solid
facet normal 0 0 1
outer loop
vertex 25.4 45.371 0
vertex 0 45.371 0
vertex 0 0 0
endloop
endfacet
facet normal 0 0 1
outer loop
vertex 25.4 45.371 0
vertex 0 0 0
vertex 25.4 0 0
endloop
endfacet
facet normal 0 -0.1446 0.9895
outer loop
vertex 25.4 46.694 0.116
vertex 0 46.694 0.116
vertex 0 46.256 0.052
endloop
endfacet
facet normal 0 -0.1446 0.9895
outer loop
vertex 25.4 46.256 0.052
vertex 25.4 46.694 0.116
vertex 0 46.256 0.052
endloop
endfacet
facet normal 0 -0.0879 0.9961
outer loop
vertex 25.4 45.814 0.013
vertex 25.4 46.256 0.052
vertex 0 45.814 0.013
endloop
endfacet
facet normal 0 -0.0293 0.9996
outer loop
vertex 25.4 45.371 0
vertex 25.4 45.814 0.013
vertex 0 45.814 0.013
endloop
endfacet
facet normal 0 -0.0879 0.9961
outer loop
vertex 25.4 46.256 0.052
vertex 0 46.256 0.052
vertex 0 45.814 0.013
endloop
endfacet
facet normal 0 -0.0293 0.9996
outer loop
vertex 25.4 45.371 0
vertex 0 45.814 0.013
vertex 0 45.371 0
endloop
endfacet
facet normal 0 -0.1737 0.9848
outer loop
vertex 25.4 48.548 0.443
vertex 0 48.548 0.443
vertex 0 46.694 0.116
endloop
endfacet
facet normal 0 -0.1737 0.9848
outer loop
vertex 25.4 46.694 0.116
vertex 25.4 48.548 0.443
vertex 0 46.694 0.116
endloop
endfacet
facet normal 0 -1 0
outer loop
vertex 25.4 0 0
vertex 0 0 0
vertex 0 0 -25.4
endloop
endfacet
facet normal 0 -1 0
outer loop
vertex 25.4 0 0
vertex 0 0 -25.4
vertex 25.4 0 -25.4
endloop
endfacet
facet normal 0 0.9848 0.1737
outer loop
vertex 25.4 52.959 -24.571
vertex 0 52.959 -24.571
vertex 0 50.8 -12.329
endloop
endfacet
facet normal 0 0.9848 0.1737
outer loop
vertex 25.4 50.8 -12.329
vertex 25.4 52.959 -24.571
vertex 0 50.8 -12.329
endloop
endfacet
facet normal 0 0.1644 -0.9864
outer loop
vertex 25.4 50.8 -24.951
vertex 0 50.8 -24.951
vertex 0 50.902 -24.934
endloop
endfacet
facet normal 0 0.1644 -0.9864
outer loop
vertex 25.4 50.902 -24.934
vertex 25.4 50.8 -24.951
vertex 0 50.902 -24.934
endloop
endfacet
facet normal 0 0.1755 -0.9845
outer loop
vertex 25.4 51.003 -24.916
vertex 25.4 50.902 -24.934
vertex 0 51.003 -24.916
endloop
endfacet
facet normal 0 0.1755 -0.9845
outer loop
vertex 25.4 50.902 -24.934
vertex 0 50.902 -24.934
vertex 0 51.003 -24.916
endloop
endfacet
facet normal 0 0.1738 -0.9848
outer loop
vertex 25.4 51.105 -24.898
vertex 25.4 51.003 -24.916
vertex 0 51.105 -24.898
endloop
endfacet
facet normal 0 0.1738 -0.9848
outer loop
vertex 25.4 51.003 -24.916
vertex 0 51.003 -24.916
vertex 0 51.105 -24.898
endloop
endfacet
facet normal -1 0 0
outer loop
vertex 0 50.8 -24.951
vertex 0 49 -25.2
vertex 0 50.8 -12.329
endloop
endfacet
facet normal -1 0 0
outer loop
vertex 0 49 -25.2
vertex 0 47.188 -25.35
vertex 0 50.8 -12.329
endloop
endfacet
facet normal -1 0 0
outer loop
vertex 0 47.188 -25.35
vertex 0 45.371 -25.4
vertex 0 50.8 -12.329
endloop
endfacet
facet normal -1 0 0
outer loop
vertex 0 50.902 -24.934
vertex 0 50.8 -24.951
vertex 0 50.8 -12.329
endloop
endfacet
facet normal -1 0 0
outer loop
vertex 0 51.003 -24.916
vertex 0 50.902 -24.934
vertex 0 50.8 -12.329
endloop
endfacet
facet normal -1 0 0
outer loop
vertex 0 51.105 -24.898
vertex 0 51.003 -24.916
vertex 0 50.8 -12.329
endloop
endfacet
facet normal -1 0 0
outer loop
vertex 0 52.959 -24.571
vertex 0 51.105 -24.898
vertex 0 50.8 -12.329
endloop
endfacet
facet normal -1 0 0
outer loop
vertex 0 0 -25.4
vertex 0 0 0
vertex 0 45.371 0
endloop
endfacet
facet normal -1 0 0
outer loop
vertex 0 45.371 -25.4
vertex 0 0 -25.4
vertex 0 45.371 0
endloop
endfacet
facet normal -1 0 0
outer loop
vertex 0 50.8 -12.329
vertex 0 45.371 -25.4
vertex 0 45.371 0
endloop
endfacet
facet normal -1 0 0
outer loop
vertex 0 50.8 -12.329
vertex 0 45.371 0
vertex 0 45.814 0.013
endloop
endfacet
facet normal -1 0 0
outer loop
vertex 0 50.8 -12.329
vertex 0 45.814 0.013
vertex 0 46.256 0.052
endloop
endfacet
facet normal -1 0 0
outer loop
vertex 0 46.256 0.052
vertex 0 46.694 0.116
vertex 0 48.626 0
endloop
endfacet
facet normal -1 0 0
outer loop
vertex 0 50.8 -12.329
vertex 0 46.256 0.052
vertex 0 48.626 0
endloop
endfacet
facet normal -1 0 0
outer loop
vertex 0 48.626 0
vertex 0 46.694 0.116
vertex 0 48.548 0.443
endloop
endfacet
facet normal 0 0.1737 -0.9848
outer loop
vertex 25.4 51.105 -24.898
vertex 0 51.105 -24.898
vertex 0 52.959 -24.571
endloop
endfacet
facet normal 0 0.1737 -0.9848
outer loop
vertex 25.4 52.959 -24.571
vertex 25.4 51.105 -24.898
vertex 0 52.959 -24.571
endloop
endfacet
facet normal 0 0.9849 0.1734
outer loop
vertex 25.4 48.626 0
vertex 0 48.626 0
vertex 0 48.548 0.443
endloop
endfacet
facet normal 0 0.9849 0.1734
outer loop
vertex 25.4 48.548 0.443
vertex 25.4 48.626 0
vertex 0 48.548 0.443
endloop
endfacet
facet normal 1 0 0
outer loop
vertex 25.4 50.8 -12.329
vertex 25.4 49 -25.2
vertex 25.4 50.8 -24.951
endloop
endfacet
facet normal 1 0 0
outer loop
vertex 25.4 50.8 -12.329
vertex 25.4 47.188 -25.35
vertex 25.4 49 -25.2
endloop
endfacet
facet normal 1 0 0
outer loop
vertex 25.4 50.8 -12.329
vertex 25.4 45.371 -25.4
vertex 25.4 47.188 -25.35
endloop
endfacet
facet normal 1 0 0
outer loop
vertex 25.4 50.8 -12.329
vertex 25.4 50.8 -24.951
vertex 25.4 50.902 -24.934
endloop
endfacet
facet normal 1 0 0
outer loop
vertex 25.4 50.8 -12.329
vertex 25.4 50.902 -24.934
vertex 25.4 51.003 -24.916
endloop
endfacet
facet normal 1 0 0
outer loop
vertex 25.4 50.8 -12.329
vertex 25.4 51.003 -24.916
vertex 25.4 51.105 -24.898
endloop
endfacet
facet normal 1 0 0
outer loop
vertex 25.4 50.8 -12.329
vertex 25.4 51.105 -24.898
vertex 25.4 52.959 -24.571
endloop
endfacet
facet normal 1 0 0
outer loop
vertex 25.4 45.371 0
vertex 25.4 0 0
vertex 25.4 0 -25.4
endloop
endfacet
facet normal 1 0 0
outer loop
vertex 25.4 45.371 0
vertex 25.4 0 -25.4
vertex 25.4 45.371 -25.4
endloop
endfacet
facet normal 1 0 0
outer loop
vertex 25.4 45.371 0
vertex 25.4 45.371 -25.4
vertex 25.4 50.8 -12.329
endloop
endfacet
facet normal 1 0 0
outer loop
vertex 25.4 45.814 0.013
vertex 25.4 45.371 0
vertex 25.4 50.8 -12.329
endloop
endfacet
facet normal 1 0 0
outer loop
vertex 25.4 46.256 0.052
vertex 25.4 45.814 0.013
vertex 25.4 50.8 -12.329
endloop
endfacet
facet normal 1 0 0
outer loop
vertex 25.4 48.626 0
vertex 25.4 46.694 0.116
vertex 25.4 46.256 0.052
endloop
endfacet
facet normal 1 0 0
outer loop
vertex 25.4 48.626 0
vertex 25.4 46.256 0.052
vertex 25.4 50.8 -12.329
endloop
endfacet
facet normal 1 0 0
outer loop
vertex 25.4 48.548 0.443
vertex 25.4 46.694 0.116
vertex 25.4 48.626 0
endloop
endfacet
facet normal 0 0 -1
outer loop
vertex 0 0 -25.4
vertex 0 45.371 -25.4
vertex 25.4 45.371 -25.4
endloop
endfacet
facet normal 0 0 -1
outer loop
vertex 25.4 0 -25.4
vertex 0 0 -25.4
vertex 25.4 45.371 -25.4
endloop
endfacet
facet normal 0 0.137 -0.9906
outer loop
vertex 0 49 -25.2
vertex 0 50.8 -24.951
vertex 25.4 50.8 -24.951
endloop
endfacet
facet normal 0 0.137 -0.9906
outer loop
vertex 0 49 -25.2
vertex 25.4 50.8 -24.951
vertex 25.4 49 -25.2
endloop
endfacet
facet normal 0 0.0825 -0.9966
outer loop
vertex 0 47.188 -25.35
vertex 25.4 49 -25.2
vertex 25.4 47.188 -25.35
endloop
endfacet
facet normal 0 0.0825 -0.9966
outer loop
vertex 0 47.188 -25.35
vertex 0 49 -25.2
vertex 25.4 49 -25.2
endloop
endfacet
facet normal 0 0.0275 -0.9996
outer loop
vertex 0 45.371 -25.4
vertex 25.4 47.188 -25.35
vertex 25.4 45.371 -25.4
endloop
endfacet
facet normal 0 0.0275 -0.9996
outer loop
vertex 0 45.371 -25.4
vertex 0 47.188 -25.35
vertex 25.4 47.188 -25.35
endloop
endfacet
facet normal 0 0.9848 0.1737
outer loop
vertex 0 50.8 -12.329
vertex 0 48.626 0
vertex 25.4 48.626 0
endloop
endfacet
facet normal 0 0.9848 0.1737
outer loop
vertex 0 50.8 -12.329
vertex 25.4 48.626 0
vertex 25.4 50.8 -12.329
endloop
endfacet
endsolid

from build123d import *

# Parameters (mm, degrees)
SKETCH1_W              = 25.4
SKETCH1_H              = 50.8
BASE_FLANGE1_DEPTH     = 25.4
SKETCHED_BEND2_DEPTH   = 25.4
SKETCHED_BEND2_2_DEPTH = 25.4


# Read off the part's stored shape, not the designer's step: Sketched Bend2
# Sheet-metal steps are written as plain solids
with BuildPart() as part:
    # Sketch1 → Base-Flange1 (new body)
    with BuildSketch(Plane.XY):
        with Locations((12.7, 25.4)):
            Rectangle(SKETCH1_W, SKETCH1_H)
    extrude(amount=-BASE_FLANGE1_DEPTH)

    # Sketched Bend2 outline → Sketched Bend2 (cut)
    with BuildSketch(Plane.YZ):
        with BuildLine():
            Line((50.8, -25.4), (50.8, -24.950657177))
            ThreePointArc((50.8, -24.950657177), (48.094844213, -25.287472556), (45.37112433, -25.4))
            Line((45.37112433, -25.4), (50.8, -25.4))
        make_face()
        Polygon((50.8, 0), (48.626141092, 0), (50.8, -12.328566501), align=None)
    extrude(amount=SKETCHED_BEND2_DEPTH, mode=Mode.SUBTRACT)

    # Sketched Bend2 2 outline → Sketched Bend2 2 (add)
    with BuildSketch(Plane.YZ):
        with BuildLine():
            Line((52.958756408, -24.57148247), (50.8, -12.328566501))
            Line((50.8, -12.328566501), (50.8, -24.950657177))
            ThreePointArc((50.8, -24.950657177), (50.95255485, -24.924861858), (51.104987157, -24.898352004))
            Line((51.104987157, -24.898352004), (52.958756408, -24.57148247))
        make_face()
        with BuildLine():
            Line((48.548092695, 0.442634457), (46.694323444, 0.115764922))
            ThreePointArc((46.694323444, 0.115764922), (46.03525109, 0.028996401), (45.37112433, 0))
            Line((45.37112433, 0), (48.626141092, 0))
            Line((48.626141092, 0), (48.548092695, 0.442634457))
        make_face()
    extrude(amount=SKETCHED_BEND2_2_DEPTH)


solid = part.part
